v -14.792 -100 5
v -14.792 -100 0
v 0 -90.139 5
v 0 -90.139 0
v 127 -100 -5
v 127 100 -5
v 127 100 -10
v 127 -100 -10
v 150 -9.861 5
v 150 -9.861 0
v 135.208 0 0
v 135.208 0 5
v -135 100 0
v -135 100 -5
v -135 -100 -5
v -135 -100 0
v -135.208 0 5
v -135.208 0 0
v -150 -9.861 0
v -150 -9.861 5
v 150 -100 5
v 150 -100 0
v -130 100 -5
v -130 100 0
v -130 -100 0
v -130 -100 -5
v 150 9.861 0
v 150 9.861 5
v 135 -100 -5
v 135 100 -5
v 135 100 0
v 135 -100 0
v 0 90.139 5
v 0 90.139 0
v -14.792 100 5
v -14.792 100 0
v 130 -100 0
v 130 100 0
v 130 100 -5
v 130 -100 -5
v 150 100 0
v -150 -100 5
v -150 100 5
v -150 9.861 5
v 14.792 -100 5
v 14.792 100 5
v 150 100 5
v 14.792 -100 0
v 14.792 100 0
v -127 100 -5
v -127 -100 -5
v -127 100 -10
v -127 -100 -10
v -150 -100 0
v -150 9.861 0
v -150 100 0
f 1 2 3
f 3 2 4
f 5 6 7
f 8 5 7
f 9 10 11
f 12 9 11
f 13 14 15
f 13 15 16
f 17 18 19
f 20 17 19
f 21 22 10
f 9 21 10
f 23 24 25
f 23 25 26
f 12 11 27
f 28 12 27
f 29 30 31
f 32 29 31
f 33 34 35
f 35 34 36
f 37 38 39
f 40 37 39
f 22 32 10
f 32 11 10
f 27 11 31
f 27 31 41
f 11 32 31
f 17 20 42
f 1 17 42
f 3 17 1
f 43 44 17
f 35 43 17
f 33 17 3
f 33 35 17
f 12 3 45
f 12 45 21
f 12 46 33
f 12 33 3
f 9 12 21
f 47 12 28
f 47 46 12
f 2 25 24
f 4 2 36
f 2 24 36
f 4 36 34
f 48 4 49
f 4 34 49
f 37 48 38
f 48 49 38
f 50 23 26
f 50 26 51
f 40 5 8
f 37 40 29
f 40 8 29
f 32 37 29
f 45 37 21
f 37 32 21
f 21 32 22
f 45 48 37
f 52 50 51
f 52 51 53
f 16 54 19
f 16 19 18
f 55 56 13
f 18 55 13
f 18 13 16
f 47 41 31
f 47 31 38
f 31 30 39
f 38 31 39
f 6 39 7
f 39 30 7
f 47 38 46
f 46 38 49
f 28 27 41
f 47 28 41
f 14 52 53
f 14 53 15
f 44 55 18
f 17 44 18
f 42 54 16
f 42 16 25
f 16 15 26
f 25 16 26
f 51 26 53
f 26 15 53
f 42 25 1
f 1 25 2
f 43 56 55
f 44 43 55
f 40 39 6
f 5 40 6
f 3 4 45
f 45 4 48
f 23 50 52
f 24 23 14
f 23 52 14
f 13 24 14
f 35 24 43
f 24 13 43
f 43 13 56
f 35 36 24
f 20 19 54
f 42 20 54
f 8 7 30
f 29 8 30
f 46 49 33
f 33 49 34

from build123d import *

# Parameters (mm, degrees)
BOSS_EXTRUDE1_DEPTH = 5
BOSS_EXTRUDE2_DEPTH = 200


with BuildPart() as part:
    # Sketch1 → Boss-Extrude1 (new body)
    with BuildSketch(Plane.XY):
        Polygon((-150, 100), (-150, 9.861218113), (-135.20817283, 0), (-150, -9.861218113), (-150, -100), (-14.79182717, -100), (0, -90.138781887), (14.79182717, -100), (150, -100), (150, -9.861218113), (135.20817283, 0), (150, 9.861218113), (150, 100), (14.79182717, 100), (0, 90.138781887), (-14.79182717, 100), align=None)
    extrude(amount=BOSS_EXTRUDE1_DEPTH)

    # Sketch2 → Boss-Extrude2 (add)
    with BuildSketch(Plane(origin=(0, 100, 0), x_dir=(1, 0, 0), z_dir=(0, 1, 0))):
        Polygon((-135, 0), (-130, 0), (-130, 5), (-127, 5), (-127, 10), (-135, 5), align=None)
    boss_extrude2 = extrude(amount=-BOSS_EXTRUDE2_DEPTH)

    # Mirror1: Boss-Extrude2 across plane
    add(boss_extrude2.mirror(Plane(origin=(0, 0, 0), x_dir=(0, 0, 1), z_dir=(1, 0, 0))))


solid = part.part
